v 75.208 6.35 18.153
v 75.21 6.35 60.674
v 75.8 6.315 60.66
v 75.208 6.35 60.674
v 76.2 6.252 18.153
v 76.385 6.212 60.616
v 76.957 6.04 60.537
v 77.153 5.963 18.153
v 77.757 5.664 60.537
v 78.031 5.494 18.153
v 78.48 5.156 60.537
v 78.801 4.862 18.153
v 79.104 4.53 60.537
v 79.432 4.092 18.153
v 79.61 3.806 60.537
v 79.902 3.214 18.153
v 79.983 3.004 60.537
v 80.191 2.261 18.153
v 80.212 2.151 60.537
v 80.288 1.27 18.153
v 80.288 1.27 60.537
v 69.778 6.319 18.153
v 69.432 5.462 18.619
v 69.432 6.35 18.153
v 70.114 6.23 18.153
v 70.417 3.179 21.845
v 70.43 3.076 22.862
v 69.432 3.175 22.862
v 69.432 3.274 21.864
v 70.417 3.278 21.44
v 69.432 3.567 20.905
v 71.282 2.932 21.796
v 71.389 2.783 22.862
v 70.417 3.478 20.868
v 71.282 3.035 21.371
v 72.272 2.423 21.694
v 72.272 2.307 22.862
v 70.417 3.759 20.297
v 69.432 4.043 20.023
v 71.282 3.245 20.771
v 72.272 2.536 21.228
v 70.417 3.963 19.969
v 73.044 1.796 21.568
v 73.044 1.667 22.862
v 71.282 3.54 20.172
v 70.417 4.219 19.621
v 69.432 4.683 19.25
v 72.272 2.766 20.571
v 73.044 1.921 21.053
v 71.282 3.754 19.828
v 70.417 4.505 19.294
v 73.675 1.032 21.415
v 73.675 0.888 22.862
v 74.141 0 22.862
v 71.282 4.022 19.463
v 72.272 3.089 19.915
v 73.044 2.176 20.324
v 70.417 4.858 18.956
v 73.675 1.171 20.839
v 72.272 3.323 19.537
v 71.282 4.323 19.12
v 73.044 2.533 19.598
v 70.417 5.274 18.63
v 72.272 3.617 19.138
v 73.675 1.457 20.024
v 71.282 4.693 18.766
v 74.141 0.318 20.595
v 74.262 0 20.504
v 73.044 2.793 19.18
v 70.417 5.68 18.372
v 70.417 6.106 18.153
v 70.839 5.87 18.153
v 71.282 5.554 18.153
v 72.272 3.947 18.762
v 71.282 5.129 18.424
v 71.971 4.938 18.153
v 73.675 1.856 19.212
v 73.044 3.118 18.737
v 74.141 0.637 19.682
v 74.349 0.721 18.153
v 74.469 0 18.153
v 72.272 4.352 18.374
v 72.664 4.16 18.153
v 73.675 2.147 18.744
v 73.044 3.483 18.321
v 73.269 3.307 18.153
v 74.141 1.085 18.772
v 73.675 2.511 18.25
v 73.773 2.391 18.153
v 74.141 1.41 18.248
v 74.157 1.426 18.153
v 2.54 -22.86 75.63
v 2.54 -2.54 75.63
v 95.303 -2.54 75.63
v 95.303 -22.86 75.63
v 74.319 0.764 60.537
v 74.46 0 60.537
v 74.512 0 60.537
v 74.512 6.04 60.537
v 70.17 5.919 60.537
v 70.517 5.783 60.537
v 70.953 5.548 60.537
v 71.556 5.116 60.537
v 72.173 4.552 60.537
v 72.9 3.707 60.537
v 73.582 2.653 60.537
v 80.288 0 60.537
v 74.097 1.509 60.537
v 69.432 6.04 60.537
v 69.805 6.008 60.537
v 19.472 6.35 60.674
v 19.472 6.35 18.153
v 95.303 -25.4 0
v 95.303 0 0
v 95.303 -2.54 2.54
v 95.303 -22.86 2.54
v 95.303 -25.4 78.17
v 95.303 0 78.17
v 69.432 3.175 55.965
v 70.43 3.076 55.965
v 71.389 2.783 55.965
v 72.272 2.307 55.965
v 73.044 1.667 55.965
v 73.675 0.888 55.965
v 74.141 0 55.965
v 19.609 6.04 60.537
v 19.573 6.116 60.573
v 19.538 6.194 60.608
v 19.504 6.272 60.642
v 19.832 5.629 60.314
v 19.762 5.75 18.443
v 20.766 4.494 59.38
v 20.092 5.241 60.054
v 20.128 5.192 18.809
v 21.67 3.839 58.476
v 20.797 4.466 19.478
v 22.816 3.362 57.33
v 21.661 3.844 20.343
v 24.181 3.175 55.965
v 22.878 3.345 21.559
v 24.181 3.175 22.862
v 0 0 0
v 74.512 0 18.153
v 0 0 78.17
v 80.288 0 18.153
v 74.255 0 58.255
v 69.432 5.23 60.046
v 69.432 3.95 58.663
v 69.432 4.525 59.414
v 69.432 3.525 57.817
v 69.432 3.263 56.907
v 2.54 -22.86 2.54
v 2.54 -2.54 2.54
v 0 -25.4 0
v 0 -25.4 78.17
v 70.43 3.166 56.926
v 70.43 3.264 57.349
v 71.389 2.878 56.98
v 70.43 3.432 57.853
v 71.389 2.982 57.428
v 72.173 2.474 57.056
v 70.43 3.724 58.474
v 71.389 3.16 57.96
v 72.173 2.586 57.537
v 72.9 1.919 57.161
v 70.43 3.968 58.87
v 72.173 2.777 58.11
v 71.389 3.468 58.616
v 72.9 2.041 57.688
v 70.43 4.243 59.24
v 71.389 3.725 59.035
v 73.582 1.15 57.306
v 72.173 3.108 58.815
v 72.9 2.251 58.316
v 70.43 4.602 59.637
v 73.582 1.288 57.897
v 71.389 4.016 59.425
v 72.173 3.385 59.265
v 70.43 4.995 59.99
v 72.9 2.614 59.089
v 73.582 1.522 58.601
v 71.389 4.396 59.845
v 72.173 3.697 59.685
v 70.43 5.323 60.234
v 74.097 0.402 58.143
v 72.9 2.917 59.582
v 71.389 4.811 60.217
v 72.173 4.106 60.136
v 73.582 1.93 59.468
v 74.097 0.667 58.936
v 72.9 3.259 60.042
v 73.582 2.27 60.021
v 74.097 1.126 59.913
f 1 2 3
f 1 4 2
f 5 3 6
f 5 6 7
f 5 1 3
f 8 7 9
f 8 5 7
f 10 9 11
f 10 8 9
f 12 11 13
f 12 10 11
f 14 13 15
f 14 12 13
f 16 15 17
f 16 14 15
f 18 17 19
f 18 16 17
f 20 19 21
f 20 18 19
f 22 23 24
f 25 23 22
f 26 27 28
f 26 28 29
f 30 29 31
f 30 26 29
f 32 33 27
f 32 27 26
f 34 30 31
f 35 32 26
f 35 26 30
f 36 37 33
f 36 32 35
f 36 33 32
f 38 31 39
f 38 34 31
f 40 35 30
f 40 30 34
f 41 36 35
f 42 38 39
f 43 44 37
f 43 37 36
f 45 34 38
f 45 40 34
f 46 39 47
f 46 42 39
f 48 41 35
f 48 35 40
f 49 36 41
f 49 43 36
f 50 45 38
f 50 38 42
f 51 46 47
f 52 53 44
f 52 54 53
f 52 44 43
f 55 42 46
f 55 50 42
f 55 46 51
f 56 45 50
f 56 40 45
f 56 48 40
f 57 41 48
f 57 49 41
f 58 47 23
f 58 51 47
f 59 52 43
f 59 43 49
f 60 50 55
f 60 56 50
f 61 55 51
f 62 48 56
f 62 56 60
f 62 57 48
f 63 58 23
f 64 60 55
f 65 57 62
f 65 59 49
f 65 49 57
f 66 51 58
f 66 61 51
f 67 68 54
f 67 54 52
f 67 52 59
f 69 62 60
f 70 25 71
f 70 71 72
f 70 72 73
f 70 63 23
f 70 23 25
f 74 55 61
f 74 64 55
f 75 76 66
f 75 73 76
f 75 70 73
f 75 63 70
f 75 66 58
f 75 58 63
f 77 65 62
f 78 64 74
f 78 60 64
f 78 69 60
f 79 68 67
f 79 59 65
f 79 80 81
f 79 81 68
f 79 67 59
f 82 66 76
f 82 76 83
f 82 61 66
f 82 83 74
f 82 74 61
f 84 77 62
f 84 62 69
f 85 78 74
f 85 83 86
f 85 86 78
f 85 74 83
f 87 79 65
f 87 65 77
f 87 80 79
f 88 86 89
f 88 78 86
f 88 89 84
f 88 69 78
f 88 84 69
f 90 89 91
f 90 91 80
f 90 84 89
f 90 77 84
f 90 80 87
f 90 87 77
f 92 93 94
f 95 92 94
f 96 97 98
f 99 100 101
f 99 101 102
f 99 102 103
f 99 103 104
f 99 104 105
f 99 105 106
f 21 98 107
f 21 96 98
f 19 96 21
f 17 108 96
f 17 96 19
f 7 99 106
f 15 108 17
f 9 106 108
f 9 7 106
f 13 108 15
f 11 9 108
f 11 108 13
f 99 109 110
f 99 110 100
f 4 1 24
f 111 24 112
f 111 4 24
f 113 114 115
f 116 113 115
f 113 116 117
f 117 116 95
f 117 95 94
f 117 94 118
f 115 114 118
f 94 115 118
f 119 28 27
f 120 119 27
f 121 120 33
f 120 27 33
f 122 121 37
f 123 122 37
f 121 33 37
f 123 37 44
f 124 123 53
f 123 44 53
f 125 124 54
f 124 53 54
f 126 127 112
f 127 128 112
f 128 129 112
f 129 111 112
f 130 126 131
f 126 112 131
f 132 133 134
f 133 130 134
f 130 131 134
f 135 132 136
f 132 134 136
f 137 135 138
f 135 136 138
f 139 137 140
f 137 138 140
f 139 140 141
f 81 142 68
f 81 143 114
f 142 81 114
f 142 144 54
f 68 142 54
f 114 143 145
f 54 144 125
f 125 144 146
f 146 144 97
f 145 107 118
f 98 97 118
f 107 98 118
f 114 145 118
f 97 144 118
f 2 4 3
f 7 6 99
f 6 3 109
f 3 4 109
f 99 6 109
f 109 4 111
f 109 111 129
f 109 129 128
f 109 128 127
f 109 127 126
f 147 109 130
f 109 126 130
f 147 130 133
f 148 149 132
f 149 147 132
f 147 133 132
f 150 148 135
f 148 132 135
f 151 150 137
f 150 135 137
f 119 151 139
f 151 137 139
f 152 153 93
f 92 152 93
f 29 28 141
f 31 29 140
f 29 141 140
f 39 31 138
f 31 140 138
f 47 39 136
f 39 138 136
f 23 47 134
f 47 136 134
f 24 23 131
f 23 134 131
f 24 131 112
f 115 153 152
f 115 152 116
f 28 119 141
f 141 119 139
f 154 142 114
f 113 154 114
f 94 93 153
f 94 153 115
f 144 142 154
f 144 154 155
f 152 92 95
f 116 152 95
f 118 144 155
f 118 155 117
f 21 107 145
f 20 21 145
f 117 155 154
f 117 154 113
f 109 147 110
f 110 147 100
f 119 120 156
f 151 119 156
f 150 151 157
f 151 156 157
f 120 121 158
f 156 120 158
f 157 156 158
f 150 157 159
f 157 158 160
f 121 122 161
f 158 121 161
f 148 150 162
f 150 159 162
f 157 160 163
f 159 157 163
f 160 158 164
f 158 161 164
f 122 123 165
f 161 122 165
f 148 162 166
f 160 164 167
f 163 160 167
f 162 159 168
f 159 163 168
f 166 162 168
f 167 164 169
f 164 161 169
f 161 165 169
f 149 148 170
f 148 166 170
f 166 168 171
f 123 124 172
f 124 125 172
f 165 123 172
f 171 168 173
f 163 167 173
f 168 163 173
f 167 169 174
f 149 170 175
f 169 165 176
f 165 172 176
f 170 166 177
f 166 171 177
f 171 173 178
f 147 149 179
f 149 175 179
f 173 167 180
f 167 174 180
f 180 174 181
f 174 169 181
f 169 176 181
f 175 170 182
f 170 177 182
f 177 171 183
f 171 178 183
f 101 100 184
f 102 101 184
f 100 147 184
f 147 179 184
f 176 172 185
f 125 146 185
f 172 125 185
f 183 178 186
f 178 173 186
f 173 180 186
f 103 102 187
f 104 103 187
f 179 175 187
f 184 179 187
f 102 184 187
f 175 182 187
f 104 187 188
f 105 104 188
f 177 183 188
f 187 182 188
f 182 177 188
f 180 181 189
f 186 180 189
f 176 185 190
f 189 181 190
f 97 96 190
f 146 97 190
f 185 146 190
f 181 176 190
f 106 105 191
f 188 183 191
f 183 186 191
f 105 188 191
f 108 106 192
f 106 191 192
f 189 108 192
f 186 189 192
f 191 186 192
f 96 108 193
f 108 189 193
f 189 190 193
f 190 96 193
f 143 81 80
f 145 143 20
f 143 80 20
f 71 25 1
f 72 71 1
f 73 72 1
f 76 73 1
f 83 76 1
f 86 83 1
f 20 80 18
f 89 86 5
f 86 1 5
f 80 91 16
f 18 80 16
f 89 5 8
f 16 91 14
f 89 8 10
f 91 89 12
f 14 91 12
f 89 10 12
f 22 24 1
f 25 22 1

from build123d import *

# Parameters (mm, degrees)
F0_W         = 95.3032001853
F0_H         = 78.1703665853
F1_DEPTH     = 25.4
F2_T         = -2.54
F3_W         = 5.7767406106
F3_H         = 42.3835292459
F4_DEPTH     = 3.175
F5_W         = 5.7767406106
F5_H         = 42.3835292459
F6_DEPTH     = 3.175
F7_T1_DEPTH  = 66.0677355788
F7_T3_DEPTH  = 66.8133734297
F7_T8_DEPTH  = 84.3633291385
F7_T13_DEPTH = 84.3633291385
F8_T1_DEPTH  = 33.1027333037
F8_T6_ANGLE  = 211.2479562886
F8_T12_ANGLE = 207.4140629141
F8_T15_DEPTH = 67.9213053823


# Not quite as in the source:
# - a fillet or chamfer that OpenCascade refuses, or shapes differently, is made with other operations: its cross-section is extruded or revolved along the edge and cut away or added


with BuildPart() as f1:
    # F0 (on Front) → F1 (new body)
    with BuildSketch(Plane.XZ):
        with Locations((47.6516000926, 39.0851832926)):
            Rectangle(F0_W, F0_H)
    extrude(amount=F1_DEPTH)

    # F2
    f2_openings = [f1.faces().sort_by_distance(p)[0] for p in [
        (95.3032, -12.7, 39.085183),
    ]]
    offset(amount=F2_T, openings=f2_openings)

    # F3 (on face) → F4 (join)
    with BuildSketch(Plane(origin=(0, 0, 0), x_dir=(-1, 0, 0), z_dir=(0, 1, 0))):
        with Locations((-77.4001292884, 39.3448248506)):
            Rectangle(F3_W, F3_H)
    extrude(amount=F4_DEPTH)

    # F5 (on face) → F6 (join)
    with BuildSketch(Plane(origin=(0, 3.175, 0), x_dir=(-1, 0, 0), z_dir=(0, 1, 0))):
        Polygon((-74.5117589831, 60.5365894735), (-74.5117589831, 18.1530602276), (-19.4716006517, 18.1530602276), (-19.4716006517, 60.6743656099), (-80.2884995937, 60.6743656099), (-80.2884995937, 60.5365894735), align=None)
        with Locations((-77.4001292884, 39.3448248506)):
            Rectangle(F5_W, F5_H)
    extrude(amount=F6_DEPTH)

    # F7: fillet of radius 5.08 on 3 edges, made by hand

    # F7_s2 → F7_t1 (cut)
    with BuildSketch(Plane.XY.offset(6.3798451294)):
        with BuildLine():
            ThreePointArc((19.4716006517, 6.35), (21.3410803596, 4.0428865162), (24.180886691, 3.175))
            Line((24.180886691, 3.175), (19.4716006517, 3.175))
            Line((19.4716006517, 3.175), (19.4716006517, 6.35))
        make_face()
    extrude(amount=F7_T1_DEPTH, mode=Mode.SUBTRACT)

    # F7_s4 → F7_t3 (cut)
    with BuildSketch(Plane.YZ.offset(7.6983855535)):
        with BuildLine():
            ThreePointArc((3.175, 22.8623462669), (4.0428865162, 20.0225399355), (6.35, 18.1530602276))
            Line((6.35, 18.1530602276), (3.175, 18.1530602276))
            Line((3.175, 18.1530602276), (3.175, 22.8623462669))
        make_face()
    extrude(amount=F7_T3_DEPTH, mode=Mode.SUBTRACT)


with BuildPart() as f7_tool6:
    # F7_s7 → F7_t8 (new body)
    with BuildSketch(Plane.YZ.offset(7.6983855535)):
        with BuildLine():
            ThreePointArc((6.35, 60.6743656099), (4.0428865162, 58.804885902), (3.175, 55.9650795706))
            Line((3.175, 55.9650795706), (3.175, 60.6743656099))
            Line((3.175, 60.6743656099), (6.35, 60.6743656099))
        make_face()
    extrude(amount=F7_T8_DEPTH)

    split(bisect_by=Plane.XY.offset(60.5365894735), keep=Keep.TOP)


with BuildPart() as f1_1:
    add(f1.part)

    # F7_t5: cut F7_tool6
    add(f7_tool6.part, mode=Mode.SUBTRACT)


with BuildPart() as f7_tool11:
    # F7_s12 → F7_t13 (new body)
    with BuildSketch(Plane.YZ.offset(7.6983855535)):
        with BuildLine():
            ThreePointArc((6.35, 60.6743656099), (4.0428865162, 58.804885902), (3.175, 55.9650795706))
            Line((3.175, 55.9650795706), (3.175, 60.6743656099))
            Line((3.175, 60.6743656099), (6.35, 60.6743656099))
        make_face()
    extrude(amount=F7_T13_DEPTH)

    split(bisect_by=Plane.YZ.offset(74.5117589831), keep=Keep.BOTTOM)


with BuildPart() as f1_2:
    add(f1_1.part)

    # F7_t10: cut F7_tool11
    add(f7_tool11.part, mode=Mode.SUBTRACT)

    # F8: fillet of radius 5.08 on 2 edges, made by hand

    # F8_s2 → F8_t1 (join)
    with BuildSketch(Plane.XY.offset(22.8623462669)):
        with BuildLine():
            ThreePointArc((69.4317589831, 3.175), (73.0238614316, 1.6871024484), (74.5117589831, -1.905))
            Line((74.5117589831, -1.905), (74.5117589831, 3.175))
            Line((74.5117589831, 3.175), (69.4317589831, 3.175))
        make_face()
    extrude(amount=F8_T1_DEPTH)


with BuildPart() as f8_tool4:
    # F8_s5 → F8_t6 (revolve)
    with BuildSketch(Plane.XY.offset(22.8623462668)):
        with BuildLine():
            ThreePointArc((69.4317589831, 3.175), (73.0238614316, 1.6871024484), (74.5117589831, -1.905))
            Line((74.5117589831, -1.905), (74.5117589831, 3.175))
            Line((74.5117589831, 3.175), (69.4317589831, 3.175))
        make_face()
    revolve(axis=Axis((74.5117589831, 8.2549999999, 22.8623462668), (1, 0, 0)), revolution_arc=F8_T6_ANGLE)

    split(bisect_by=Plane.XZ.offset(-6.35), keep=Keep.TOP)

    split(bisect_by=Plane.XY.offset(18.1530602276), keep=Keep.TOP)


with BuildPart() as f1_3:
    add(f1_2.part)

    # F8_t3: union F8_tool4
    add(f8_tool4.part)


with BuildPart() as f8_tool10:
    # F8_s11 → F8_t12 (revolve)
    with BuildSketch(Plane.XY.offset(55.9650795707)):
        with BuildLine():
            ThreePointArc((69.4317589831, 3.175), (73.0238614316, 1.6871024484), (74.5117589831, -1.905))
            Line((74.5117589831, -1.905), (74.5117589831, 3.175))
            Line((74.5117589831, 3.175), (69.4317589831, 3.175))
        make_face()
    revolve(axis=Axis((74.5117589831, 8.2549999999, 55.9650795707), (-1, 0, 0)), revolution_arc=F8_T12_ANGLE)

    split(bisect_by=Plane.XZ.offset(-6.35), keep=Keep.TOP)

    split(bisect_by=Plane.XY.offset(60.5365894735), keep=Keep.BOTTOM)


with BuildPart() as f1_4:
    add(f1_3.part)

    # F8_t9: union F8_tool10
    add(f8_tool10.part)

    # F8_s16 → F8_t15 (cut)
    with BuildSketch(Plane.XY.offset(5.4530602276)):
        with BuildLine():
            ThreePointArc((75.2084995937, 6.35), (78.8006020422, 4.8621024484), (80.2884995937, 1.27))
            Line((80.2884995937, 1.27), (80.2884995937, 6.35))
            Line((80.2884995937, 6.35), (75.2084995937, 6.35))
        make_face()
    extrude(amount=F8_T15_DEPTH, mode=Mode.SUBTRACT)


solid = f1_4.part
